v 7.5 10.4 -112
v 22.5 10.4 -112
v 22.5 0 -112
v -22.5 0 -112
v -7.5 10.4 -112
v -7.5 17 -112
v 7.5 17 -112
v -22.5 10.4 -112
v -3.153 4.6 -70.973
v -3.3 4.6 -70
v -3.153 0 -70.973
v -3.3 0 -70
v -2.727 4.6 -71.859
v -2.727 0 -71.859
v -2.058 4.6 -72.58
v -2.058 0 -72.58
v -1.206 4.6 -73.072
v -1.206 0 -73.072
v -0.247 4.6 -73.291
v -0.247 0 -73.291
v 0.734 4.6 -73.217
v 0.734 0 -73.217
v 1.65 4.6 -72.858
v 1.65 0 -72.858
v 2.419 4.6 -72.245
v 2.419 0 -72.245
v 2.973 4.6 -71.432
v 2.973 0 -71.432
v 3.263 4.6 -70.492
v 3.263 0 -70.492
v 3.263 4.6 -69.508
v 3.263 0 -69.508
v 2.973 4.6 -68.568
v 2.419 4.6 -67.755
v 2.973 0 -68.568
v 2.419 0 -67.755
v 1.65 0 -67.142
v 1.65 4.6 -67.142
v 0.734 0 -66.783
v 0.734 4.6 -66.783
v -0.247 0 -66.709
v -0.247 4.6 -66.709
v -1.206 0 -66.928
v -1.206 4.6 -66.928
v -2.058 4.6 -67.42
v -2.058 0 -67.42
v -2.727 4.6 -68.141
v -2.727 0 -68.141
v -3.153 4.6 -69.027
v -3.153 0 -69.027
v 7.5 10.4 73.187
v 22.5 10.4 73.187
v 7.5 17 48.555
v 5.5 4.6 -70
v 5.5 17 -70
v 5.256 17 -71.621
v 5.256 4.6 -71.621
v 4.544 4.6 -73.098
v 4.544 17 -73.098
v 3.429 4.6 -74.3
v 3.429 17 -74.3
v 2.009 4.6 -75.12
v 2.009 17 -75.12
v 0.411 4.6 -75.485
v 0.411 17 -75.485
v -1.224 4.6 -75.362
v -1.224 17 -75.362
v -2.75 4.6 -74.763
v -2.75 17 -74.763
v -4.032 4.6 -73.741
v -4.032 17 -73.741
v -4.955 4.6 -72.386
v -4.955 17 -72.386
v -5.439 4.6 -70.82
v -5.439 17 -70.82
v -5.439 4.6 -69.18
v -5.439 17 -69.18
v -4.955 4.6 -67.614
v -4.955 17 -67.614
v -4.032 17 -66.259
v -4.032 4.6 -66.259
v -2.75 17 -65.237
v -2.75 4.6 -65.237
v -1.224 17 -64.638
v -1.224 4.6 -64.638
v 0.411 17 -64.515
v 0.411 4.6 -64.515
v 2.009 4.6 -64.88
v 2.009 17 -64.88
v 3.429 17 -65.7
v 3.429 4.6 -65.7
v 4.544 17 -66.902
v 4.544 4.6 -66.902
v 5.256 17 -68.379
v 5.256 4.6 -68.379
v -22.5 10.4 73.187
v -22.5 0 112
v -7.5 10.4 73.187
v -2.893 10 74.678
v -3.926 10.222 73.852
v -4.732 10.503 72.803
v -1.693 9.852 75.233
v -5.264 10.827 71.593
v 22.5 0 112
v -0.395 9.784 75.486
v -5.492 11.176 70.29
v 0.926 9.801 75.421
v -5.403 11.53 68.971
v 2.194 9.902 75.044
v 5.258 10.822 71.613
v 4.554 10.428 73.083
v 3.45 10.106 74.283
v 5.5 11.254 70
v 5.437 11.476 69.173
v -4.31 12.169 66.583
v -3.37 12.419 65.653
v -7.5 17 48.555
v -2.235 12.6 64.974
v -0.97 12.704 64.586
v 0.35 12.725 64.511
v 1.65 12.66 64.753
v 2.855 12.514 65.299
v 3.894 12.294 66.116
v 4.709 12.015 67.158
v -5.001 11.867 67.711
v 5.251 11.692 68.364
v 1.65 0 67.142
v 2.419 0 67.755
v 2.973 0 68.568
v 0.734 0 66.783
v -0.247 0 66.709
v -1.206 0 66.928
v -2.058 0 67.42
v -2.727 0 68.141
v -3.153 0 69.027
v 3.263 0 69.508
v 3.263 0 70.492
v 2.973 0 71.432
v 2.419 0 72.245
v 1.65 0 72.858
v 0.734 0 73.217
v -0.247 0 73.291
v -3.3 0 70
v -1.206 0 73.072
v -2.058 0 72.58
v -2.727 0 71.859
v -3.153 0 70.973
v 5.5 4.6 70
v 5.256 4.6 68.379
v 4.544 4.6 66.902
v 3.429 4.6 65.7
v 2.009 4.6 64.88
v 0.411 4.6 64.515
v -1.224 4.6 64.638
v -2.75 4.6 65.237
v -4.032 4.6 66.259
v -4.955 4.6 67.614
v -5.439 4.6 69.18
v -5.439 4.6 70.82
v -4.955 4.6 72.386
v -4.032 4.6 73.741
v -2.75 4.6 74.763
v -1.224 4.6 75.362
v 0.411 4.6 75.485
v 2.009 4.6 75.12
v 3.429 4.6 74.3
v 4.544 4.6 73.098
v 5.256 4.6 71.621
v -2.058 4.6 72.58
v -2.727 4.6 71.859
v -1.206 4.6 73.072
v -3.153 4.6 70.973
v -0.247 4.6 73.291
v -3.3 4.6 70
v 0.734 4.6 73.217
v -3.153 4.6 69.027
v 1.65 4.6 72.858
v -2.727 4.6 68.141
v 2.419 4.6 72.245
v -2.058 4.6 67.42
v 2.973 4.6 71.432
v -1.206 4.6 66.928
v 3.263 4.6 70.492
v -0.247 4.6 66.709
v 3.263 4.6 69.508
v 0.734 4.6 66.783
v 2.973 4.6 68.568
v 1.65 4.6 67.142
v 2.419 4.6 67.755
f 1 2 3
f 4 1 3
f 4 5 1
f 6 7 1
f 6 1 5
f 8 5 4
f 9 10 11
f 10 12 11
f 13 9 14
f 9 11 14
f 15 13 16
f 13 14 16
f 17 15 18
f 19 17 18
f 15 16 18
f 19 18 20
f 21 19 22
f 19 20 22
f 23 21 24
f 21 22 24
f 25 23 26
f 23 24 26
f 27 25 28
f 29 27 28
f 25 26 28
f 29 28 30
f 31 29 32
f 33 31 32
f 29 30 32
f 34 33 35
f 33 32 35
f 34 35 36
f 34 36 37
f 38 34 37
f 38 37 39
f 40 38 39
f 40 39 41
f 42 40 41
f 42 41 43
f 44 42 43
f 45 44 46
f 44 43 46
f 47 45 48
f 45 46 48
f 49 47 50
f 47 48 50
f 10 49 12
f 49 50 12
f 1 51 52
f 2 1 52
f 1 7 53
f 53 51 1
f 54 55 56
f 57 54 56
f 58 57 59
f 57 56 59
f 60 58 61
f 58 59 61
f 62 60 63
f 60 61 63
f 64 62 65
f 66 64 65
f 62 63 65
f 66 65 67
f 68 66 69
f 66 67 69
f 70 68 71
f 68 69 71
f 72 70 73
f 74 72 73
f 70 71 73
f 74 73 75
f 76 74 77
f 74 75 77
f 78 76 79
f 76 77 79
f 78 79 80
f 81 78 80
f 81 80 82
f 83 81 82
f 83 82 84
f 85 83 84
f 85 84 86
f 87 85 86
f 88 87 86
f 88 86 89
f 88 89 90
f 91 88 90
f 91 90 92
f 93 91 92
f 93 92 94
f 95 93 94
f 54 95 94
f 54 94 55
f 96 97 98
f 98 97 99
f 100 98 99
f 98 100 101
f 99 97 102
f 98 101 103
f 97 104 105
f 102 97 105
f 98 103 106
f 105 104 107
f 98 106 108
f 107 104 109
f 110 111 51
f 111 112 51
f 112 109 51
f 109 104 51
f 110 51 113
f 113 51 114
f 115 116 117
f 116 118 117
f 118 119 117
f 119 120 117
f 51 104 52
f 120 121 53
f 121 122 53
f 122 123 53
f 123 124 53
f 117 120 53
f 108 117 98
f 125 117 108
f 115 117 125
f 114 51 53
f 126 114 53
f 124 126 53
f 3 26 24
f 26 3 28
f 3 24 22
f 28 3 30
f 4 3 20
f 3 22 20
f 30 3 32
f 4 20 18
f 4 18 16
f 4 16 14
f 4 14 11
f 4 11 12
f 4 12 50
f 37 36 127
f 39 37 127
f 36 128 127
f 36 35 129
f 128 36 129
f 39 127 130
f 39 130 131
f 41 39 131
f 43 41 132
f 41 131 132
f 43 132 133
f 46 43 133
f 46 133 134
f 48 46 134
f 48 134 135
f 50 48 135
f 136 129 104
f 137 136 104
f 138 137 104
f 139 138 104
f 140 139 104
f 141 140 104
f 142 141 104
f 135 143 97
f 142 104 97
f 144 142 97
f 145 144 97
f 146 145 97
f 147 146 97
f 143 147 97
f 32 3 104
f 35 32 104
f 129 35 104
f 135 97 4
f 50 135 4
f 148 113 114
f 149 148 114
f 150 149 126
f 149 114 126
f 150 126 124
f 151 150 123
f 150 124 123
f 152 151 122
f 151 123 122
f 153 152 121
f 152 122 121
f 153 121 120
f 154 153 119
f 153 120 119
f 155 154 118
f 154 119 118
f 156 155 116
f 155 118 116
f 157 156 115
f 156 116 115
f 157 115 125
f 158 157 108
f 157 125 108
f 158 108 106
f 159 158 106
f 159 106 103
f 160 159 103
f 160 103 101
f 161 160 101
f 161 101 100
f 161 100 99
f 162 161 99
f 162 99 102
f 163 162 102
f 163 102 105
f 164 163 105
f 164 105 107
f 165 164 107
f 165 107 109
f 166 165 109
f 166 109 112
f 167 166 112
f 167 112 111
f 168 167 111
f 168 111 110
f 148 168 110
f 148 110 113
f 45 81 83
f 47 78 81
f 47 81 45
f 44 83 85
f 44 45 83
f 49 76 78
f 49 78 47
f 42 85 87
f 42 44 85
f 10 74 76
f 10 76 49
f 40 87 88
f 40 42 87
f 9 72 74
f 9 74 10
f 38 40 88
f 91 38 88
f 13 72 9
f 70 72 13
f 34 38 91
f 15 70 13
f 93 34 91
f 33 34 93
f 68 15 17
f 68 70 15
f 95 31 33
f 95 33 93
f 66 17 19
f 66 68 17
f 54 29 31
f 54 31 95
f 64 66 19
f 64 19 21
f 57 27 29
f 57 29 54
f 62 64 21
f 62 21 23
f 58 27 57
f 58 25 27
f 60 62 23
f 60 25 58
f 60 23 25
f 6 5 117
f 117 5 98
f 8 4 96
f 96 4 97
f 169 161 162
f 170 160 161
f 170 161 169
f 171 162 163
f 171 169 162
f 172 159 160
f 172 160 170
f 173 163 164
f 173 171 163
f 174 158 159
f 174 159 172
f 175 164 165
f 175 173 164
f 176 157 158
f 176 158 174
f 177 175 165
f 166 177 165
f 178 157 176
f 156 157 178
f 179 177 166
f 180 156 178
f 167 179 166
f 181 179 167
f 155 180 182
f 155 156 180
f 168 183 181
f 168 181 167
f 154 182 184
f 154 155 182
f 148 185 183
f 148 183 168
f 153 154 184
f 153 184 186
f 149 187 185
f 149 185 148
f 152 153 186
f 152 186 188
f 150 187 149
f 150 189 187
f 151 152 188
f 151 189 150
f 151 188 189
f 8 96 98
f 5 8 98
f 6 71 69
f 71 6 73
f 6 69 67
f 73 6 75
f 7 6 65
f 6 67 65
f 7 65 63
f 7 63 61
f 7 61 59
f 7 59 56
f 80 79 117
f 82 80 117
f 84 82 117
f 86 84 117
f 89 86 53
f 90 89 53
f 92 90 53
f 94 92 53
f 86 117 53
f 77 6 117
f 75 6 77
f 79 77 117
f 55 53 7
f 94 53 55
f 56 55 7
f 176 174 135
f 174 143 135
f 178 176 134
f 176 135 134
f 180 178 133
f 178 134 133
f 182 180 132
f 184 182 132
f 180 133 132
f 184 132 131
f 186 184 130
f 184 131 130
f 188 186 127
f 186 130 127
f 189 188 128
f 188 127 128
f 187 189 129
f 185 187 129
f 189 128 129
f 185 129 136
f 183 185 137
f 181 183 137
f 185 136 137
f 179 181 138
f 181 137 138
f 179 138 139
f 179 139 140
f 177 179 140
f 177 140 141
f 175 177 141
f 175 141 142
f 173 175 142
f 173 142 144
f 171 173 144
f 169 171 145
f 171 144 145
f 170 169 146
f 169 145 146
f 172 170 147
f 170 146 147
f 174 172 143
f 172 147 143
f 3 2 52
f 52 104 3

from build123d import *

# Parameters (mm, degrees)
EXTRUDE_1_DEPTH             = 112
CUT_EXTRUDE_2_DEPTH         = 122.893396048
HOLE_WIZARD_M61_D           = 6.6
HOLE_WIZARD_M61_DEPTH       = 20
HOLE_WIZARD_M61_CBORE_D     = 11
HOLE_WIZARD_M61_CBORE_DEPTH = 12.4
HOLE_WIZARD_M61_TIP         = 1.982840043


with BuildPart() as part:
    # Эскиз1 → Бобышка-Вытянуть1 (new, symmetric)
    with BuildSketch(Plane.XY):
        Polygon((22.5, 0), (-22.5, 0), (-22.5, 10.4), (-7.5, 10.4), (-7.5, 17), (7.5, 17), (7.5, 10.4), (22.5, 10.4), align=None)
    extrude(amount=EXTRUDE_1_DEPTH, both=True)

    # Эскиз5 → Вырез-Вытянуть2 (cut, through all)
    with BuildSketch(Plane(origin=(22.5, 0, 0), x_dir=(0, 0, -1), z_dir=(1, 0, 0))):
        Polygon((-112, 0), (-48.555136271, 17), (-112, 17), align=None)
    extrude(amount=-CUT_EXTRUDE_2_DEPTH, mode=Mode.SUBTRACT)

    # Цековка для винта с внутренним шестигранником M61
    with Locations(Plane(origin=(0, 17, 0), x_dir=(1, 0, 0), z_dir=(0, 1, 0))):
        with Locations((0, -210), (0, 70), (0, -70)):
            CounterBoreHole(HOLE_WIZARD_M61_D / 2, HOLE_WIZARD_M61_CBORE_D / 2, HOLE_WIZARD_M61_CBORE_DEPTH, depth=HOLE_WIZARD_M61_DEPTH)
            with Locations((0, 0, -(HOLE_WIZARD_M61_DEPTH + HOLE_WIZARD_M61_TIP / 2))):  # 118° drill point
                Cone(0, HOLE_WIZARD_M61_D / 2, HOLE_WIZARD_M61_TIP, mode=Mode.SUBTRACT)


solid = part.part
